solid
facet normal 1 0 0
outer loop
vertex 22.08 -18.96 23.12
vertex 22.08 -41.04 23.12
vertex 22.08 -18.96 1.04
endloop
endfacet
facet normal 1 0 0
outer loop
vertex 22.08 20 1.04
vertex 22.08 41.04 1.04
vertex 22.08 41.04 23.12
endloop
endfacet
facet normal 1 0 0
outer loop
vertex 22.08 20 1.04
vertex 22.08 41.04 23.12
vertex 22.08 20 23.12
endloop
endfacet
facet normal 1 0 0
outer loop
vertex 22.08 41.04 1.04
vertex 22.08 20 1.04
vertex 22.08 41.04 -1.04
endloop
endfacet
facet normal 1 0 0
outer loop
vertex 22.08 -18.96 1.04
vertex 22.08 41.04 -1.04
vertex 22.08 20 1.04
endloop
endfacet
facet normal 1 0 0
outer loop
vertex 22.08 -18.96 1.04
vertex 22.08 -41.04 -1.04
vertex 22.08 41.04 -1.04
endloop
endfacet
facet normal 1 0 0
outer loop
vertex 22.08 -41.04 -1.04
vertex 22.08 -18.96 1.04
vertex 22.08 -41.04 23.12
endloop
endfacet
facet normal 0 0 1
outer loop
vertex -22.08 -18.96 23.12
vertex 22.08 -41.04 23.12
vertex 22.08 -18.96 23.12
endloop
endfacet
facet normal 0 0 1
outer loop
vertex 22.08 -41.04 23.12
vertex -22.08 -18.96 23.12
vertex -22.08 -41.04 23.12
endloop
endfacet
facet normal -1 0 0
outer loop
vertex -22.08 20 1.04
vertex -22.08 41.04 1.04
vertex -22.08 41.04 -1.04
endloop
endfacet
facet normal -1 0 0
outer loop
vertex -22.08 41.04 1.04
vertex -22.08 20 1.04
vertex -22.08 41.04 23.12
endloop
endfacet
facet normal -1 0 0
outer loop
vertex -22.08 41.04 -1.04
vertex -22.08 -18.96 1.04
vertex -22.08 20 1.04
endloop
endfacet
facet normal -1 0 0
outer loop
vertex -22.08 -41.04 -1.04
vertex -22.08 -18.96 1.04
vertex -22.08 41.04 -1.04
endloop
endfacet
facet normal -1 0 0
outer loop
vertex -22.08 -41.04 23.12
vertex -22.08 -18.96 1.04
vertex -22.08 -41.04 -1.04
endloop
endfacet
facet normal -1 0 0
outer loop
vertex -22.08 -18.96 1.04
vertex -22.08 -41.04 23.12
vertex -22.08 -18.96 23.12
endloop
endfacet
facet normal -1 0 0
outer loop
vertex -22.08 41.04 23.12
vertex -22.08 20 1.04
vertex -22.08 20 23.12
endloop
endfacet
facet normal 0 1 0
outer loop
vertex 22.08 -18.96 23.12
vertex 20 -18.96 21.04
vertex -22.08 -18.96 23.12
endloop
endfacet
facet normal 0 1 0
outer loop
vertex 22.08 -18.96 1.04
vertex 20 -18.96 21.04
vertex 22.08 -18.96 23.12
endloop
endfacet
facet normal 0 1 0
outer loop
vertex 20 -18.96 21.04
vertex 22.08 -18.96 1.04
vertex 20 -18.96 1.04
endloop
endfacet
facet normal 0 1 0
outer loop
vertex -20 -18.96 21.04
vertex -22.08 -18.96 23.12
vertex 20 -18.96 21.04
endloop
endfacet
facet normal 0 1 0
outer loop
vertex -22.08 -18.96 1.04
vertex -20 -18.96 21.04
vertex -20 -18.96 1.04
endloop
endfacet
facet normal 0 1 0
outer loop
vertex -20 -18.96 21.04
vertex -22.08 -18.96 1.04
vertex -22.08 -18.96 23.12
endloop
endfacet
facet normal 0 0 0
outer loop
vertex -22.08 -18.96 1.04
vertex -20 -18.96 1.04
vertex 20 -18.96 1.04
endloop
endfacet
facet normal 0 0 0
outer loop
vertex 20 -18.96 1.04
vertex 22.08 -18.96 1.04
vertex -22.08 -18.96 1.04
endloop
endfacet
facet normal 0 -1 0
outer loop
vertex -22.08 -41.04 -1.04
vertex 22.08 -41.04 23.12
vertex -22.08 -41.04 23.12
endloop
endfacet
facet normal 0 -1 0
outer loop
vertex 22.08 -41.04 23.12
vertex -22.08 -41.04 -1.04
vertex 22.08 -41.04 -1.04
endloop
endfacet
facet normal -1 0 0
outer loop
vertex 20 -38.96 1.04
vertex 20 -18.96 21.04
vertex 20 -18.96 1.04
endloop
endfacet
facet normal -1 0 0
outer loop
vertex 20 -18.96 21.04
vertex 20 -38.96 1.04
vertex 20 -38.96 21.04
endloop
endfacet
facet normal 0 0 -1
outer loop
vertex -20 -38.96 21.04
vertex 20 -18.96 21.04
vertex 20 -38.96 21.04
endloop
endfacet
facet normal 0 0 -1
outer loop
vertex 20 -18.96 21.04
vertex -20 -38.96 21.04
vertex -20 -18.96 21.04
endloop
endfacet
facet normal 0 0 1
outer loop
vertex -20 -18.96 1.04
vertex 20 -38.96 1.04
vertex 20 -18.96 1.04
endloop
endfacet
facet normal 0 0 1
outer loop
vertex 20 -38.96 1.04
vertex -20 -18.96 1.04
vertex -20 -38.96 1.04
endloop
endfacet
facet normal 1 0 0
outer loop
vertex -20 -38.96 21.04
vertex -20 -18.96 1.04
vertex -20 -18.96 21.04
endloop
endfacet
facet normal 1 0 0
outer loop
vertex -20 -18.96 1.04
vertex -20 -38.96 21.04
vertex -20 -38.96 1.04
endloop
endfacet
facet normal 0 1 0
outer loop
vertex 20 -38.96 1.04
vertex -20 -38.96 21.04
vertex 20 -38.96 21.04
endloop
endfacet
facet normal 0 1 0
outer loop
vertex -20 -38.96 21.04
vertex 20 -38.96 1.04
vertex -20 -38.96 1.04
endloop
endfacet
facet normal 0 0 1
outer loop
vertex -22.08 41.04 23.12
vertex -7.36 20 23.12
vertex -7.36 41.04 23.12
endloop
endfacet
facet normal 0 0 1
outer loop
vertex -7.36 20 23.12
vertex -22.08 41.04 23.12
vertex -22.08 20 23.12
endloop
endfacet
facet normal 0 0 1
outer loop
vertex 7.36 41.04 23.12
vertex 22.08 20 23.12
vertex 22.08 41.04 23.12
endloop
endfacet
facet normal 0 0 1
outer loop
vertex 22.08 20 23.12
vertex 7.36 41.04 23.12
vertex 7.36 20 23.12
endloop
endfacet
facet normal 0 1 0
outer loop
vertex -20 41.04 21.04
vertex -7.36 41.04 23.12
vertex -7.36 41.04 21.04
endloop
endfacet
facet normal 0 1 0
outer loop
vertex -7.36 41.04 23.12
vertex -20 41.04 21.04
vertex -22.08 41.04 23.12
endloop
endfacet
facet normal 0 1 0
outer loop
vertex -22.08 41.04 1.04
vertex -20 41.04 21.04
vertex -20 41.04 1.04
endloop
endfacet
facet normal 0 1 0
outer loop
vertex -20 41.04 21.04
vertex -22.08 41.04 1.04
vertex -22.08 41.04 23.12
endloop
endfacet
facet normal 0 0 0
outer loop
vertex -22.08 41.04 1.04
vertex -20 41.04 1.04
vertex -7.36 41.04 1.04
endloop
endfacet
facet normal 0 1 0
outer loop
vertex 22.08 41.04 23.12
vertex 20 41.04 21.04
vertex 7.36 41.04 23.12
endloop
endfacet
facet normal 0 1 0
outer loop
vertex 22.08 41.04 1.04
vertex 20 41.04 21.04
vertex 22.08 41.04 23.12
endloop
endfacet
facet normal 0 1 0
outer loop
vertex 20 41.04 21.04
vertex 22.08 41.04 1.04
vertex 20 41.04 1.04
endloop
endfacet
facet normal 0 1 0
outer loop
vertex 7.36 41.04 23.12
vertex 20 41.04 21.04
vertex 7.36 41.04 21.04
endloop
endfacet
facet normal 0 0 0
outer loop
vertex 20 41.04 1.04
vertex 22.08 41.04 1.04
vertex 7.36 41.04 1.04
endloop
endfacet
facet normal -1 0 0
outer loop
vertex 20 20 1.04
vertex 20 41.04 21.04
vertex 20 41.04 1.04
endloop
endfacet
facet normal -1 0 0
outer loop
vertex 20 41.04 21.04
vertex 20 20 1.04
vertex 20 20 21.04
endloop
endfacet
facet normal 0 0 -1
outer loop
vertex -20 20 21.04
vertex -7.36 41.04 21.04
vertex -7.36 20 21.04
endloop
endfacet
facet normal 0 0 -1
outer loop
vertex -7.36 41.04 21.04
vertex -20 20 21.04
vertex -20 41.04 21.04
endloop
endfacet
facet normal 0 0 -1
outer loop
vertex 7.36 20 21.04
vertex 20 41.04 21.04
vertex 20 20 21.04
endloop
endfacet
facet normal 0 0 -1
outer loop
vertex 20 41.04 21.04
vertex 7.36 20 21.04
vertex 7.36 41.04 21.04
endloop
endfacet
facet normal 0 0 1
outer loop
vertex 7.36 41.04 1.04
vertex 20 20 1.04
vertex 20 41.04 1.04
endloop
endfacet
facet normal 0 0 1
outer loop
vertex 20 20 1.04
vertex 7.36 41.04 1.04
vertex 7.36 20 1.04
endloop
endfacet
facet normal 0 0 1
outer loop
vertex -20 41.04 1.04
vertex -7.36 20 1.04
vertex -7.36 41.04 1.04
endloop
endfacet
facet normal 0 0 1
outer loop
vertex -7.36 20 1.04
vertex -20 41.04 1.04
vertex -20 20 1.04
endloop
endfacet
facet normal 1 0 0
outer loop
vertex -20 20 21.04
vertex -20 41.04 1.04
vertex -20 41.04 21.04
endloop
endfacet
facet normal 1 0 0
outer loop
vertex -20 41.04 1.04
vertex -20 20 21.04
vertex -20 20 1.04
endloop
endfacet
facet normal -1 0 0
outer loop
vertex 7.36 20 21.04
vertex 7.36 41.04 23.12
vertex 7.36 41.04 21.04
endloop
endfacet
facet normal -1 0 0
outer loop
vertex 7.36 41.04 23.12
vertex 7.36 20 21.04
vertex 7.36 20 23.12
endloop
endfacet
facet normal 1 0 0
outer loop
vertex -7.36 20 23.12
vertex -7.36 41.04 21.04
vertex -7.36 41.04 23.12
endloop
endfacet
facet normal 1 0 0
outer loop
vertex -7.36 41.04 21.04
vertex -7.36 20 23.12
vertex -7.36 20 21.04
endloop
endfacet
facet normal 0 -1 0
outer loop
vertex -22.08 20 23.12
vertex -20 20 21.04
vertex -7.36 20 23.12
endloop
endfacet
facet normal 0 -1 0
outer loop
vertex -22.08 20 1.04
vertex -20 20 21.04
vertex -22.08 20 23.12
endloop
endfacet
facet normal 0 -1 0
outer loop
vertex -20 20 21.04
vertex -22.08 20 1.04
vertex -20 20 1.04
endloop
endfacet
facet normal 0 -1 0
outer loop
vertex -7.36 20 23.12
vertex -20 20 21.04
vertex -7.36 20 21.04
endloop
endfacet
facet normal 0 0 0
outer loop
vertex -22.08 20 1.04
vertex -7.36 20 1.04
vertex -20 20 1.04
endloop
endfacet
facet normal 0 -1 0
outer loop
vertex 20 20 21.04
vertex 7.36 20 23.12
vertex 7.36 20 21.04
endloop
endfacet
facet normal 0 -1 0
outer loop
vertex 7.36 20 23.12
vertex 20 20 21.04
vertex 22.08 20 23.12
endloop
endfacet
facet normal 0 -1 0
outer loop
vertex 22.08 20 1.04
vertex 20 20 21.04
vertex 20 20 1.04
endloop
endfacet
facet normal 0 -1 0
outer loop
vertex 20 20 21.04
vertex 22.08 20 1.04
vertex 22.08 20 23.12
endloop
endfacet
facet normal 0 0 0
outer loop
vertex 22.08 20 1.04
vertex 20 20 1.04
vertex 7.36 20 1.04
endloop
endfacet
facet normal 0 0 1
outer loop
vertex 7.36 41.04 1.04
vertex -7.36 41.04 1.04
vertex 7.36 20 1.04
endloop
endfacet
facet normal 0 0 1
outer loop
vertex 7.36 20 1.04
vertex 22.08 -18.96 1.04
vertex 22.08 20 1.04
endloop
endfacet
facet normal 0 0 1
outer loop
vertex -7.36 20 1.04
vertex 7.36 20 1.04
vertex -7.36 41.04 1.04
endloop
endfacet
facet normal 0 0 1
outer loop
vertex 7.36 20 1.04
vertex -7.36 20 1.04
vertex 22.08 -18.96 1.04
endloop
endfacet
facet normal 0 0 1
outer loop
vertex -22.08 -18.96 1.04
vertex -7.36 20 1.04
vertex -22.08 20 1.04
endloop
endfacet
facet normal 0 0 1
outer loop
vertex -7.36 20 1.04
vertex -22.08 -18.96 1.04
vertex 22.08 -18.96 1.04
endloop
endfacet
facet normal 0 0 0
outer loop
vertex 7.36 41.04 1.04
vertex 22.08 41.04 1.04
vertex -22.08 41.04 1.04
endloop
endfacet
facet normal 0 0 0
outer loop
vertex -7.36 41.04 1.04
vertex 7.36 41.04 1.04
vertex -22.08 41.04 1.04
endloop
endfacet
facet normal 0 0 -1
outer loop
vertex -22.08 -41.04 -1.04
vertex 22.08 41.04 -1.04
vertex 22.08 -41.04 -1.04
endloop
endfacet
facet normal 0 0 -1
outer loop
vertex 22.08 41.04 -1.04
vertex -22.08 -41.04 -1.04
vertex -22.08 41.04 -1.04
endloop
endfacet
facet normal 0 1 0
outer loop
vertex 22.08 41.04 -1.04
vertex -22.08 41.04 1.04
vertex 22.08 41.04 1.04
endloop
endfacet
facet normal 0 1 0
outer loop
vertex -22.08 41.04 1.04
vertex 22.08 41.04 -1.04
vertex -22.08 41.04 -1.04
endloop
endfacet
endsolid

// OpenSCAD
// file: ../Libraries/Verifier.scad
// Verifier.scad: Verifies numbers against printer magic number
// Copyright (C) 2022  Jeremy Mynhier
//
// This program is free software: you can redistribute it and/or modify
// it under the terms of the GNU General Public License as published by
// the Free Software Foundation, either version 3 of the License, or
// (at your option) any later version.
//
// This program is distributed in the hope that it will be useful,
// but WITHOUT ANY WARRANTY; without even the implied warranty of
// MERCHANTABILITY or FITNESS FOR A PARTICULAR PURPOSE.  See the
// GNU General Public License for more details.
//
// You should have received a copy of the GNU General Public License
// along with this program.  If not, see <https://www.gnu.org/licenses/>.

printerMagicNumber = .04;
magicNumber = round(printerMagicNumber * 100);

module verify(number, parameter) {
    if (round(number * 100) % magicNumber != 0) {
        echo(str("Remainder of ", round(number * 100) % magicNumber, " when parameter \"", parameter, "\" (", number, ") ",
        " is divided by printer magic number of ", printerMagicNumber, "."));
        assert(false, str("Verification Failed: ", parameter));
    }
}
// main file
// remoteHolder: OpenSCAD routine to create a holder for a TV remote.
// Copyright (C) 2022  Jeremy Mynhier
//
// This program is free software: you can redistribute it and/or modify
// it under the terms of the GNU General Public License as published by
// the Free Software Foundation, either version 3 of the License, or
// (at your option) any later version.
//
// This program is distributed in the hope that it will be useful,
// but WITHOUT ANY WARRANTY; without even the implied warranty of
// MERCHANTABILITY or FITNESS FOR A PARTICULAR PURPOSE.  See the
// GNU General Public License for more details.
//
// You should have received a copy of the GNU General Public License
// along with this program.  If not, see <https://www.gnu.org/licenses/>.

use <../Libraries/Verifier.scad>

// render variables
$fa = 1;  // $fa minimum angle = 360/$fa
$fs = 0.1;  // $fs minimum size of fragment, set to print size/2

width = 40;  // width of remote
depth = 140; // Length of remote
height = 20; // height of remote
armDepth = 20; // Width of holding arms on holder
skinThickness = 2.08; // Thickness of arms and baseplate

plateDepth = (depth + armDepth) / 2 + skinThickness;

bottomXOffset = 0;
bottomYOffset = - plateDepth / 2 + (armDepth + skinThickness) / 2;
bottomZOffset = (height + skinThickness) / 2;

verify(width, "width");
verify(depth, "depth");
verify(height / 2, "height/2");
verify(armDepth, "armDepth");
verify(skinThickness / 2, "skinThickness/2");
verify(plateDepth, "plateDepth");
verify(bottomXOffset, "bottomXOffset");
verify(bottomYOffset, "bottomYOffset");
verify(bottomZOffset, "bottomZOffset");


render() {
    makeBasePlate(width, plateDepth, skinThickness);
    makeBottomBox(width, armDepth, height, skinThickness, bottomXOffset, bottomYOffset, bottomZOffset);
    makeArm(width, armDepth, height, skinThickness, 0, - bottomYOffset + skinThickness / 2, height / 2);
}

module makeBasePlate(x, y, z) {
    cube([x + 2 * z, y, z], center = true);
}

module makeBottomBox(x, y, z, thickness, xOffset, yOffset, zOffset) {
    translate([xOffset, yOffset, zOffset])
        difference() {
            cube([x + 2 * thickness, y + thickness, z + 2 * thickness], center = true);
            translate([0, thickness / 2, 0])
                cube([x, y, z], center = true);
        }
}

module makeArm(x, y, z, thickness, xOffset, yOffset, zOffset) {
    verify((x + 2 * thickness) / 3, "(x + 2 * thickness) / 3");
    translate([xOffset, yOffset - thickness, zOffset + thickness / 2])
        difference() {
            makeBottomBox(x, y + thickness, z, thickness, 0, 0, 0);
            union() {
                cube([(x + 2 * thickness) / 3, y + 2 * thickness, z + 2 * thickness], center = true);
                translate([0, - y, 0])
                    cube([x + 2 * thickness, y + thickness, z + 2 * thickness], center = true);
            }
        }
}
